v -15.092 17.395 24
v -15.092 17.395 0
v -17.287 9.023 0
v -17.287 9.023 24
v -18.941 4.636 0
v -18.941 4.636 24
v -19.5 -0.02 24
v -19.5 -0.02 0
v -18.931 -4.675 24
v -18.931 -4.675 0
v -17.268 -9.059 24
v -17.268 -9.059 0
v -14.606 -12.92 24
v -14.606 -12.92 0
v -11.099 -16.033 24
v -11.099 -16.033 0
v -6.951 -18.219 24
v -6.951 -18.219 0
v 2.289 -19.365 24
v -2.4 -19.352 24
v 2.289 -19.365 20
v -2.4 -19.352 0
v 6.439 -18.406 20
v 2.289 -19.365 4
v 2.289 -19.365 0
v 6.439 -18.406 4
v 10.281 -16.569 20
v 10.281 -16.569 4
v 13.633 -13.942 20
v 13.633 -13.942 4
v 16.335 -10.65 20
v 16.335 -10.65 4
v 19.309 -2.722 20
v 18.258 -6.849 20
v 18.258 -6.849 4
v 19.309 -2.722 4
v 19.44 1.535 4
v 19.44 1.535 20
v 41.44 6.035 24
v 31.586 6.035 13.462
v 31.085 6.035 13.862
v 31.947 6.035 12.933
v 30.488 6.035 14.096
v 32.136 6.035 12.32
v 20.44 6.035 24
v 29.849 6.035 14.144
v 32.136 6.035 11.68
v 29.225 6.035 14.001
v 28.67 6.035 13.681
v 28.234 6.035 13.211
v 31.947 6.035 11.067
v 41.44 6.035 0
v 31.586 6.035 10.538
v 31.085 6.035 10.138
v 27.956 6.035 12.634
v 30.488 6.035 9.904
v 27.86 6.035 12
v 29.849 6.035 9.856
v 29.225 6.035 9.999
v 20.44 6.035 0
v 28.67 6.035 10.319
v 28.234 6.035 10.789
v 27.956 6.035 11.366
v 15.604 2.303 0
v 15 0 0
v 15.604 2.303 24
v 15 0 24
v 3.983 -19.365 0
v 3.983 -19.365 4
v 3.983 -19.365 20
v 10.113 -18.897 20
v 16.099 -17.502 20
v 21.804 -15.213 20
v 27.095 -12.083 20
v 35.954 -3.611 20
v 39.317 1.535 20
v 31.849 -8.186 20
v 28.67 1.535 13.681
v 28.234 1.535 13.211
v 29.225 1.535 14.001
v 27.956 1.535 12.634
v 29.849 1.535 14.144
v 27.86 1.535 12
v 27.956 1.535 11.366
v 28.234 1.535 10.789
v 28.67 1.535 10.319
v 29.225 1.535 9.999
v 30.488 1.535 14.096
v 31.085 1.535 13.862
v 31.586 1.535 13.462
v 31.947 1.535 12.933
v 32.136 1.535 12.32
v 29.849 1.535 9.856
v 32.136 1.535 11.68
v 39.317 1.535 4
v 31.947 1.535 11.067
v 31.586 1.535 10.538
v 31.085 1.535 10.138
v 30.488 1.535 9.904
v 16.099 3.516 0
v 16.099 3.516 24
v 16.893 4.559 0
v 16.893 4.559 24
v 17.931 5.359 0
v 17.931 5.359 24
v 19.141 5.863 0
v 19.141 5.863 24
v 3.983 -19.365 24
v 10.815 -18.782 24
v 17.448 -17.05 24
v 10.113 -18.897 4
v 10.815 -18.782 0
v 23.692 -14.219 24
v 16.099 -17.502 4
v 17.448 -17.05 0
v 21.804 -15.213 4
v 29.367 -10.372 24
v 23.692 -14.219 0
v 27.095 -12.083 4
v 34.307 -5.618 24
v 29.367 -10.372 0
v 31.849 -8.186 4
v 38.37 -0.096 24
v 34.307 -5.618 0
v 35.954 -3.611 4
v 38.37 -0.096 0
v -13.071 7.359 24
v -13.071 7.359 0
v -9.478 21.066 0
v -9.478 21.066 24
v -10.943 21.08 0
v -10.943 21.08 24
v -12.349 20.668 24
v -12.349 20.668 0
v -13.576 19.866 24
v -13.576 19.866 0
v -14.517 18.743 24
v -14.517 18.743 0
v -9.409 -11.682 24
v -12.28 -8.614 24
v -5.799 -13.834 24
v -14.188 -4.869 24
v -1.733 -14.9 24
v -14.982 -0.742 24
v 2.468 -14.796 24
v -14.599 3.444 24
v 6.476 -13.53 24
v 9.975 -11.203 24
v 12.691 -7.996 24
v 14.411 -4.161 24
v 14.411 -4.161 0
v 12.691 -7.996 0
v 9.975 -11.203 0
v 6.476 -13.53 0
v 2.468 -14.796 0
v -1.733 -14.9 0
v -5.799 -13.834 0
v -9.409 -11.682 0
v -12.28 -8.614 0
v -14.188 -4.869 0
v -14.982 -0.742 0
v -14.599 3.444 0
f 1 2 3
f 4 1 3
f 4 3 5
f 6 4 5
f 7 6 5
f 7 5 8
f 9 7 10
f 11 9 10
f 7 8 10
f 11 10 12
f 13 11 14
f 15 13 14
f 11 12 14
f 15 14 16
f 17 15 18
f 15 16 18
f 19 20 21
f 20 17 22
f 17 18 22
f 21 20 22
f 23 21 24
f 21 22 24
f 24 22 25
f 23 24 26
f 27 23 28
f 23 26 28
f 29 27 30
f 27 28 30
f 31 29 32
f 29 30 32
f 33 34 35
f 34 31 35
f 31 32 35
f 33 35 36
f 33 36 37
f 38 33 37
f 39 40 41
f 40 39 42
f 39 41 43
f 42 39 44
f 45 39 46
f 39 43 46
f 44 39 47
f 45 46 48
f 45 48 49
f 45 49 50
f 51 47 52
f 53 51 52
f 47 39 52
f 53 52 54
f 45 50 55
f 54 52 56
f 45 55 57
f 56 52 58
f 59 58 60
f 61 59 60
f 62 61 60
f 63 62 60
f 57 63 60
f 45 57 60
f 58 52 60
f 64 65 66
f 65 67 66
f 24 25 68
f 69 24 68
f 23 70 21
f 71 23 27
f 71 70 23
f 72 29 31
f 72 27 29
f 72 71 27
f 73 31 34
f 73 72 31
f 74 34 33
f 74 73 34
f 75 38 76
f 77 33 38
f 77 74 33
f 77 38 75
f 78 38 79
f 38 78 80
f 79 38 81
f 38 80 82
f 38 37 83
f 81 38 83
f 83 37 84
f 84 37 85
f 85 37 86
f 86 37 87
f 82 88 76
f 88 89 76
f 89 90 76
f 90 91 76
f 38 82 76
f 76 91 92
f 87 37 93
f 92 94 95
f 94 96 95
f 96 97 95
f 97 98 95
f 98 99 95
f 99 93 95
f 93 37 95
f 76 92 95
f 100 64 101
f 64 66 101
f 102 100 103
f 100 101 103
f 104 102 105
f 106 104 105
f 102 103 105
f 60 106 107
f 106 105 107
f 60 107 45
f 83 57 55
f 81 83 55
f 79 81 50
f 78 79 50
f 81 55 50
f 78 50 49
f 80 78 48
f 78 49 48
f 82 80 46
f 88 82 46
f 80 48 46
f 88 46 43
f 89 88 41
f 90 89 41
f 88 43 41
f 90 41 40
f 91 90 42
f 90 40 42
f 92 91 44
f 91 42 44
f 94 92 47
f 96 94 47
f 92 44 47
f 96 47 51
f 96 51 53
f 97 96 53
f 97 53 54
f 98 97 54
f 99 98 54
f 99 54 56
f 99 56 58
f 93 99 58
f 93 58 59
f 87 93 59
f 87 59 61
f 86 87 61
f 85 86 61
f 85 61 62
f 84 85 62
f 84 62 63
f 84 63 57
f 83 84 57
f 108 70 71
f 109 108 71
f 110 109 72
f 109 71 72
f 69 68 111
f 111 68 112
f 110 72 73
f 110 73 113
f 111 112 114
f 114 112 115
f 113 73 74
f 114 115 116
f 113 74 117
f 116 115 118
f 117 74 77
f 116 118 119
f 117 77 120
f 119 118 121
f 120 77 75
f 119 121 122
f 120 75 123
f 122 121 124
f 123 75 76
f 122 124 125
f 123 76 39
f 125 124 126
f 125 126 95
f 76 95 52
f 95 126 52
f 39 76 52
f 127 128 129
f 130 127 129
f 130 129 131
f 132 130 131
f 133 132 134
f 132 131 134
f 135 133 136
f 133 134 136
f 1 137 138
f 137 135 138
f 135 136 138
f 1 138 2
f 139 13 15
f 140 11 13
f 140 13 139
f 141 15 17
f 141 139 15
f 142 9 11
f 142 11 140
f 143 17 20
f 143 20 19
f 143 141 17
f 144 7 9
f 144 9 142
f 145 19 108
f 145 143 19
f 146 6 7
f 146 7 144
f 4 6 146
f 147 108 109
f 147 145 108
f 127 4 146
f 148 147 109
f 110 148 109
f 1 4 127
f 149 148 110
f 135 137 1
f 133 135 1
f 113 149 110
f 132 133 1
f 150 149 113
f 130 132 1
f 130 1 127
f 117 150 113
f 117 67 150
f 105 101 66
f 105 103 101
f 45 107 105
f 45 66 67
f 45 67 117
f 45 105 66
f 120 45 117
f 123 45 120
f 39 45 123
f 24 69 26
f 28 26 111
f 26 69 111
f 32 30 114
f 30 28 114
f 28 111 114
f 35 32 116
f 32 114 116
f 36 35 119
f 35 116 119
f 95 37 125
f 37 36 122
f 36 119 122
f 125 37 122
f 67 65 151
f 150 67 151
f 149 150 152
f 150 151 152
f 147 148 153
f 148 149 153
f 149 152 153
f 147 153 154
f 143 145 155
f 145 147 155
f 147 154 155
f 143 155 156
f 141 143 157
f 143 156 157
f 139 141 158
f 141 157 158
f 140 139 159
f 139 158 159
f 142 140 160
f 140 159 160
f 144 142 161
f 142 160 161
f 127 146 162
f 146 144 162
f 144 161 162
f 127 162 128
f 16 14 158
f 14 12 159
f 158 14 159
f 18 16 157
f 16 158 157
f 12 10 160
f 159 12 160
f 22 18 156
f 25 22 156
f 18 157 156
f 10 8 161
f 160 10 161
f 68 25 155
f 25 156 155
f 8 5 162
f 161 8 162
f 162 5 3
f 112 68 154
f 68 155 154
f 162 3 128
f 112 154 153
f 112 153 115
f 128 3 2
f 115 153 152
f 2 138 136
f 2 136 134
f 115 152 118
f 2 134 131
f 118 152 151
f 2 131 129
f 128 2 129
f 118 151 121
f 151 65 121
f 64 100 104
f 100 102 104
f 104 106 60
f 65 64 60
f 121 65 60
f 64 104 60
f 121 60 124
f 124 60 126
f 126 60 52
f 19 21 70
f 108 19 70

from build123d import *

# Parameters (mm, degrees)
F1_DEPTH    = 24
F3_W        = 41.439505011
F3_H        = 4
F4_DEPTH    = 25
F5_DEPTH    = 25
F6_DEPTH    = 25
F7_T1_DEPTH = 191.2806862556
F7_T3_DEPTH = 191.2806862556
F8_R        = 5
F9_T1_DEPTH = 48.8746859277
F11_D       = 4.3


# Not quite as in the source:
# - a fillet or chamfer that OpenCascade refuses, or shapes differently, is made with other operations: its cross-section is extruded or revolved along the edge and cut away or added


with BuildPart() as f1:
    # F0 (on Top) → F1 (new body)
    with BuildSketch(Plane.XY):
        with BuildLine():
            ThreePointArc((15, 0), (-3.8035773729, -14.5097484185), (-13.0710398891, 7.3585267695))
            Line((-13.0710398891, 7.3585267695), (-9.4777092406, 21.0662336417))
            Line((-9.4777092406, 21.0662336417), (-13.8306337662, 22.2073068536))
            Line((-13.8306337662, 22.2073068536), (-17.2866620502, 9.0233760402))
            ThreePointArc((-17.2866620502, 9.0233760402), (-3.8959382238, -19.1068486506), (19.439505011, 1.5348110402))
            Line((19.439505011, 1.5348110402), (41.439505011, 1.5348110402))
            Line((41.439505011, 1.5348110402), (41.439505011, 6.0348110402))
            Line((41.439505011, 6.0348110402), (16.5819620065, 6.0348110402))
            Line((16.5819620065, 6.0348110402), (15, 0))
        make_face()
    extrude(amount=F1_DEPTH)

    # F3 (on offset) → F4 (join)
    with BuildSketch(Plane.XZ.offset(19.3651889598)):
        with Locations((20.7197525055, 2)):
            Rectangle(F3_W, F3_H)
        with Locations((20.7197525055, 22)):
            Rectangle(F3_W, F3_H)
    extrude(amount=-F4_DEPTH)

    # F5 (cut): a face of the model
    f5_faces = [f1.faces().sort_by_distance(p)[0] for p in [
        (6.8703868354, -3.2827389678, 20),
    ]]
    extrude(f5_faces, amount=-F5_DEPTH, mode=Mode.SUBTRACT)

    # F6 (cut): a face of the model
    f6_faces = [f1.faces().sort_by_distance(p)[0] for p in [
        (6.8703868354, -3.2827389678, 4),
    ]]
    extrude(f6_faces, amount=-F6_DEPTH, mode=Mode.SUBTRACT)

    # F7: fillet of radius 40.3173664916 on 2 edges, made by hand

    # F7_s2 → F7_t1 (cut)
    with BuildSketch(Plane.XY.offset(-73.6403431278)):
        with BuildLine():
            ThreePointArc((3.9833677598, -19.3651889598), (26.6114599119, -12.4163628374), (41.439505011, 6.0348110402))
            Line((41.439505011, 6.0348110402), (42.188627756, 5.7364637104))
            ThreePointArc((42.188627756, 5.7364637104), (42.2458523408, -6.6651889598), (42.2458523408, -19.3651889598))
            Line((42.2458523408, -19.3651889598), (41.439505011, -20.1715362896))
            Line((41.439505011, -20.1715362896), (3.9833677598, -20.1715362896))
            Line((3.9833677598, -20.1715362896), (3.9833677598, -19.3651889598))
        make_face()
    extrude(amount=F7_T1_DEPTH, mode=Mode.SUBTRACT)

    # F7_s4 → F7_t3 (cut)
    with BuildSketch(Plane.XY.offset(-93.6403431278)):
        with BuildLine():
            ThreePointArc((3.9833677598, -19.3651889598), (26.6114599119, -12.4163628374), (41.439505011, 6.0348110402))
            Line((41.439505011, 6.0348110402), (42.188627756, 5.7364637104))
            ThreePointArc((42.188627756, 5.7364637104), (42.2458523408, -6.6651889598), (42.2458523408, -19.3651889598))
            Line((42.2458523408, -19.3651889598), (41.439505011, -20.1715362896))
            Line((41.439505011, -20.1715362896), (3.9833677598, -20.1715362896))
            Line((3.9833677598, -20.1715362896), (3.9833677598, -19.3651889598))
        make_face()
    extrude(amount=F7_T3_DEPTH, mode=Mode.SUBTRACT)

    # F8
    f8_edges = [f1.edges().sort_by_distance(p)[0] for p in [
        (16.581962, 6.034811, 12),
    ]]
    fillet(f8_edges, radius=F8_R)

    # F9: fillet of radius 5 on 1 edges, made by hand

    # F9_s2 → F9_t1 (cut)
    with BuildSketch(Plane.XY.offset(-12.4373429638)):
        with BuildLine():
            ThreePointArc((-9.4777092406, 21.0662336417), (-12.9919549133, 20.3118564706), (-15.0921376669, 17.394967723))
            Line((-15.0921376669, 17.394967723), (-13.8306337662, 22.2073068536))
            Line((-13.8306337662, 22.2073068536), (-9.4777092406, 21.0662336417))
        make_face()
    extrude(amount=F9_T1_DEPTH, mode=Mode.SUBTRACT)

    # F11 (through all)
    with Locations(Plane.XZ.offset(-1.5348110402)):
        with Locations((30.0100483, 12)):
            Hole(F11_D / 2)


solid = f1.part
